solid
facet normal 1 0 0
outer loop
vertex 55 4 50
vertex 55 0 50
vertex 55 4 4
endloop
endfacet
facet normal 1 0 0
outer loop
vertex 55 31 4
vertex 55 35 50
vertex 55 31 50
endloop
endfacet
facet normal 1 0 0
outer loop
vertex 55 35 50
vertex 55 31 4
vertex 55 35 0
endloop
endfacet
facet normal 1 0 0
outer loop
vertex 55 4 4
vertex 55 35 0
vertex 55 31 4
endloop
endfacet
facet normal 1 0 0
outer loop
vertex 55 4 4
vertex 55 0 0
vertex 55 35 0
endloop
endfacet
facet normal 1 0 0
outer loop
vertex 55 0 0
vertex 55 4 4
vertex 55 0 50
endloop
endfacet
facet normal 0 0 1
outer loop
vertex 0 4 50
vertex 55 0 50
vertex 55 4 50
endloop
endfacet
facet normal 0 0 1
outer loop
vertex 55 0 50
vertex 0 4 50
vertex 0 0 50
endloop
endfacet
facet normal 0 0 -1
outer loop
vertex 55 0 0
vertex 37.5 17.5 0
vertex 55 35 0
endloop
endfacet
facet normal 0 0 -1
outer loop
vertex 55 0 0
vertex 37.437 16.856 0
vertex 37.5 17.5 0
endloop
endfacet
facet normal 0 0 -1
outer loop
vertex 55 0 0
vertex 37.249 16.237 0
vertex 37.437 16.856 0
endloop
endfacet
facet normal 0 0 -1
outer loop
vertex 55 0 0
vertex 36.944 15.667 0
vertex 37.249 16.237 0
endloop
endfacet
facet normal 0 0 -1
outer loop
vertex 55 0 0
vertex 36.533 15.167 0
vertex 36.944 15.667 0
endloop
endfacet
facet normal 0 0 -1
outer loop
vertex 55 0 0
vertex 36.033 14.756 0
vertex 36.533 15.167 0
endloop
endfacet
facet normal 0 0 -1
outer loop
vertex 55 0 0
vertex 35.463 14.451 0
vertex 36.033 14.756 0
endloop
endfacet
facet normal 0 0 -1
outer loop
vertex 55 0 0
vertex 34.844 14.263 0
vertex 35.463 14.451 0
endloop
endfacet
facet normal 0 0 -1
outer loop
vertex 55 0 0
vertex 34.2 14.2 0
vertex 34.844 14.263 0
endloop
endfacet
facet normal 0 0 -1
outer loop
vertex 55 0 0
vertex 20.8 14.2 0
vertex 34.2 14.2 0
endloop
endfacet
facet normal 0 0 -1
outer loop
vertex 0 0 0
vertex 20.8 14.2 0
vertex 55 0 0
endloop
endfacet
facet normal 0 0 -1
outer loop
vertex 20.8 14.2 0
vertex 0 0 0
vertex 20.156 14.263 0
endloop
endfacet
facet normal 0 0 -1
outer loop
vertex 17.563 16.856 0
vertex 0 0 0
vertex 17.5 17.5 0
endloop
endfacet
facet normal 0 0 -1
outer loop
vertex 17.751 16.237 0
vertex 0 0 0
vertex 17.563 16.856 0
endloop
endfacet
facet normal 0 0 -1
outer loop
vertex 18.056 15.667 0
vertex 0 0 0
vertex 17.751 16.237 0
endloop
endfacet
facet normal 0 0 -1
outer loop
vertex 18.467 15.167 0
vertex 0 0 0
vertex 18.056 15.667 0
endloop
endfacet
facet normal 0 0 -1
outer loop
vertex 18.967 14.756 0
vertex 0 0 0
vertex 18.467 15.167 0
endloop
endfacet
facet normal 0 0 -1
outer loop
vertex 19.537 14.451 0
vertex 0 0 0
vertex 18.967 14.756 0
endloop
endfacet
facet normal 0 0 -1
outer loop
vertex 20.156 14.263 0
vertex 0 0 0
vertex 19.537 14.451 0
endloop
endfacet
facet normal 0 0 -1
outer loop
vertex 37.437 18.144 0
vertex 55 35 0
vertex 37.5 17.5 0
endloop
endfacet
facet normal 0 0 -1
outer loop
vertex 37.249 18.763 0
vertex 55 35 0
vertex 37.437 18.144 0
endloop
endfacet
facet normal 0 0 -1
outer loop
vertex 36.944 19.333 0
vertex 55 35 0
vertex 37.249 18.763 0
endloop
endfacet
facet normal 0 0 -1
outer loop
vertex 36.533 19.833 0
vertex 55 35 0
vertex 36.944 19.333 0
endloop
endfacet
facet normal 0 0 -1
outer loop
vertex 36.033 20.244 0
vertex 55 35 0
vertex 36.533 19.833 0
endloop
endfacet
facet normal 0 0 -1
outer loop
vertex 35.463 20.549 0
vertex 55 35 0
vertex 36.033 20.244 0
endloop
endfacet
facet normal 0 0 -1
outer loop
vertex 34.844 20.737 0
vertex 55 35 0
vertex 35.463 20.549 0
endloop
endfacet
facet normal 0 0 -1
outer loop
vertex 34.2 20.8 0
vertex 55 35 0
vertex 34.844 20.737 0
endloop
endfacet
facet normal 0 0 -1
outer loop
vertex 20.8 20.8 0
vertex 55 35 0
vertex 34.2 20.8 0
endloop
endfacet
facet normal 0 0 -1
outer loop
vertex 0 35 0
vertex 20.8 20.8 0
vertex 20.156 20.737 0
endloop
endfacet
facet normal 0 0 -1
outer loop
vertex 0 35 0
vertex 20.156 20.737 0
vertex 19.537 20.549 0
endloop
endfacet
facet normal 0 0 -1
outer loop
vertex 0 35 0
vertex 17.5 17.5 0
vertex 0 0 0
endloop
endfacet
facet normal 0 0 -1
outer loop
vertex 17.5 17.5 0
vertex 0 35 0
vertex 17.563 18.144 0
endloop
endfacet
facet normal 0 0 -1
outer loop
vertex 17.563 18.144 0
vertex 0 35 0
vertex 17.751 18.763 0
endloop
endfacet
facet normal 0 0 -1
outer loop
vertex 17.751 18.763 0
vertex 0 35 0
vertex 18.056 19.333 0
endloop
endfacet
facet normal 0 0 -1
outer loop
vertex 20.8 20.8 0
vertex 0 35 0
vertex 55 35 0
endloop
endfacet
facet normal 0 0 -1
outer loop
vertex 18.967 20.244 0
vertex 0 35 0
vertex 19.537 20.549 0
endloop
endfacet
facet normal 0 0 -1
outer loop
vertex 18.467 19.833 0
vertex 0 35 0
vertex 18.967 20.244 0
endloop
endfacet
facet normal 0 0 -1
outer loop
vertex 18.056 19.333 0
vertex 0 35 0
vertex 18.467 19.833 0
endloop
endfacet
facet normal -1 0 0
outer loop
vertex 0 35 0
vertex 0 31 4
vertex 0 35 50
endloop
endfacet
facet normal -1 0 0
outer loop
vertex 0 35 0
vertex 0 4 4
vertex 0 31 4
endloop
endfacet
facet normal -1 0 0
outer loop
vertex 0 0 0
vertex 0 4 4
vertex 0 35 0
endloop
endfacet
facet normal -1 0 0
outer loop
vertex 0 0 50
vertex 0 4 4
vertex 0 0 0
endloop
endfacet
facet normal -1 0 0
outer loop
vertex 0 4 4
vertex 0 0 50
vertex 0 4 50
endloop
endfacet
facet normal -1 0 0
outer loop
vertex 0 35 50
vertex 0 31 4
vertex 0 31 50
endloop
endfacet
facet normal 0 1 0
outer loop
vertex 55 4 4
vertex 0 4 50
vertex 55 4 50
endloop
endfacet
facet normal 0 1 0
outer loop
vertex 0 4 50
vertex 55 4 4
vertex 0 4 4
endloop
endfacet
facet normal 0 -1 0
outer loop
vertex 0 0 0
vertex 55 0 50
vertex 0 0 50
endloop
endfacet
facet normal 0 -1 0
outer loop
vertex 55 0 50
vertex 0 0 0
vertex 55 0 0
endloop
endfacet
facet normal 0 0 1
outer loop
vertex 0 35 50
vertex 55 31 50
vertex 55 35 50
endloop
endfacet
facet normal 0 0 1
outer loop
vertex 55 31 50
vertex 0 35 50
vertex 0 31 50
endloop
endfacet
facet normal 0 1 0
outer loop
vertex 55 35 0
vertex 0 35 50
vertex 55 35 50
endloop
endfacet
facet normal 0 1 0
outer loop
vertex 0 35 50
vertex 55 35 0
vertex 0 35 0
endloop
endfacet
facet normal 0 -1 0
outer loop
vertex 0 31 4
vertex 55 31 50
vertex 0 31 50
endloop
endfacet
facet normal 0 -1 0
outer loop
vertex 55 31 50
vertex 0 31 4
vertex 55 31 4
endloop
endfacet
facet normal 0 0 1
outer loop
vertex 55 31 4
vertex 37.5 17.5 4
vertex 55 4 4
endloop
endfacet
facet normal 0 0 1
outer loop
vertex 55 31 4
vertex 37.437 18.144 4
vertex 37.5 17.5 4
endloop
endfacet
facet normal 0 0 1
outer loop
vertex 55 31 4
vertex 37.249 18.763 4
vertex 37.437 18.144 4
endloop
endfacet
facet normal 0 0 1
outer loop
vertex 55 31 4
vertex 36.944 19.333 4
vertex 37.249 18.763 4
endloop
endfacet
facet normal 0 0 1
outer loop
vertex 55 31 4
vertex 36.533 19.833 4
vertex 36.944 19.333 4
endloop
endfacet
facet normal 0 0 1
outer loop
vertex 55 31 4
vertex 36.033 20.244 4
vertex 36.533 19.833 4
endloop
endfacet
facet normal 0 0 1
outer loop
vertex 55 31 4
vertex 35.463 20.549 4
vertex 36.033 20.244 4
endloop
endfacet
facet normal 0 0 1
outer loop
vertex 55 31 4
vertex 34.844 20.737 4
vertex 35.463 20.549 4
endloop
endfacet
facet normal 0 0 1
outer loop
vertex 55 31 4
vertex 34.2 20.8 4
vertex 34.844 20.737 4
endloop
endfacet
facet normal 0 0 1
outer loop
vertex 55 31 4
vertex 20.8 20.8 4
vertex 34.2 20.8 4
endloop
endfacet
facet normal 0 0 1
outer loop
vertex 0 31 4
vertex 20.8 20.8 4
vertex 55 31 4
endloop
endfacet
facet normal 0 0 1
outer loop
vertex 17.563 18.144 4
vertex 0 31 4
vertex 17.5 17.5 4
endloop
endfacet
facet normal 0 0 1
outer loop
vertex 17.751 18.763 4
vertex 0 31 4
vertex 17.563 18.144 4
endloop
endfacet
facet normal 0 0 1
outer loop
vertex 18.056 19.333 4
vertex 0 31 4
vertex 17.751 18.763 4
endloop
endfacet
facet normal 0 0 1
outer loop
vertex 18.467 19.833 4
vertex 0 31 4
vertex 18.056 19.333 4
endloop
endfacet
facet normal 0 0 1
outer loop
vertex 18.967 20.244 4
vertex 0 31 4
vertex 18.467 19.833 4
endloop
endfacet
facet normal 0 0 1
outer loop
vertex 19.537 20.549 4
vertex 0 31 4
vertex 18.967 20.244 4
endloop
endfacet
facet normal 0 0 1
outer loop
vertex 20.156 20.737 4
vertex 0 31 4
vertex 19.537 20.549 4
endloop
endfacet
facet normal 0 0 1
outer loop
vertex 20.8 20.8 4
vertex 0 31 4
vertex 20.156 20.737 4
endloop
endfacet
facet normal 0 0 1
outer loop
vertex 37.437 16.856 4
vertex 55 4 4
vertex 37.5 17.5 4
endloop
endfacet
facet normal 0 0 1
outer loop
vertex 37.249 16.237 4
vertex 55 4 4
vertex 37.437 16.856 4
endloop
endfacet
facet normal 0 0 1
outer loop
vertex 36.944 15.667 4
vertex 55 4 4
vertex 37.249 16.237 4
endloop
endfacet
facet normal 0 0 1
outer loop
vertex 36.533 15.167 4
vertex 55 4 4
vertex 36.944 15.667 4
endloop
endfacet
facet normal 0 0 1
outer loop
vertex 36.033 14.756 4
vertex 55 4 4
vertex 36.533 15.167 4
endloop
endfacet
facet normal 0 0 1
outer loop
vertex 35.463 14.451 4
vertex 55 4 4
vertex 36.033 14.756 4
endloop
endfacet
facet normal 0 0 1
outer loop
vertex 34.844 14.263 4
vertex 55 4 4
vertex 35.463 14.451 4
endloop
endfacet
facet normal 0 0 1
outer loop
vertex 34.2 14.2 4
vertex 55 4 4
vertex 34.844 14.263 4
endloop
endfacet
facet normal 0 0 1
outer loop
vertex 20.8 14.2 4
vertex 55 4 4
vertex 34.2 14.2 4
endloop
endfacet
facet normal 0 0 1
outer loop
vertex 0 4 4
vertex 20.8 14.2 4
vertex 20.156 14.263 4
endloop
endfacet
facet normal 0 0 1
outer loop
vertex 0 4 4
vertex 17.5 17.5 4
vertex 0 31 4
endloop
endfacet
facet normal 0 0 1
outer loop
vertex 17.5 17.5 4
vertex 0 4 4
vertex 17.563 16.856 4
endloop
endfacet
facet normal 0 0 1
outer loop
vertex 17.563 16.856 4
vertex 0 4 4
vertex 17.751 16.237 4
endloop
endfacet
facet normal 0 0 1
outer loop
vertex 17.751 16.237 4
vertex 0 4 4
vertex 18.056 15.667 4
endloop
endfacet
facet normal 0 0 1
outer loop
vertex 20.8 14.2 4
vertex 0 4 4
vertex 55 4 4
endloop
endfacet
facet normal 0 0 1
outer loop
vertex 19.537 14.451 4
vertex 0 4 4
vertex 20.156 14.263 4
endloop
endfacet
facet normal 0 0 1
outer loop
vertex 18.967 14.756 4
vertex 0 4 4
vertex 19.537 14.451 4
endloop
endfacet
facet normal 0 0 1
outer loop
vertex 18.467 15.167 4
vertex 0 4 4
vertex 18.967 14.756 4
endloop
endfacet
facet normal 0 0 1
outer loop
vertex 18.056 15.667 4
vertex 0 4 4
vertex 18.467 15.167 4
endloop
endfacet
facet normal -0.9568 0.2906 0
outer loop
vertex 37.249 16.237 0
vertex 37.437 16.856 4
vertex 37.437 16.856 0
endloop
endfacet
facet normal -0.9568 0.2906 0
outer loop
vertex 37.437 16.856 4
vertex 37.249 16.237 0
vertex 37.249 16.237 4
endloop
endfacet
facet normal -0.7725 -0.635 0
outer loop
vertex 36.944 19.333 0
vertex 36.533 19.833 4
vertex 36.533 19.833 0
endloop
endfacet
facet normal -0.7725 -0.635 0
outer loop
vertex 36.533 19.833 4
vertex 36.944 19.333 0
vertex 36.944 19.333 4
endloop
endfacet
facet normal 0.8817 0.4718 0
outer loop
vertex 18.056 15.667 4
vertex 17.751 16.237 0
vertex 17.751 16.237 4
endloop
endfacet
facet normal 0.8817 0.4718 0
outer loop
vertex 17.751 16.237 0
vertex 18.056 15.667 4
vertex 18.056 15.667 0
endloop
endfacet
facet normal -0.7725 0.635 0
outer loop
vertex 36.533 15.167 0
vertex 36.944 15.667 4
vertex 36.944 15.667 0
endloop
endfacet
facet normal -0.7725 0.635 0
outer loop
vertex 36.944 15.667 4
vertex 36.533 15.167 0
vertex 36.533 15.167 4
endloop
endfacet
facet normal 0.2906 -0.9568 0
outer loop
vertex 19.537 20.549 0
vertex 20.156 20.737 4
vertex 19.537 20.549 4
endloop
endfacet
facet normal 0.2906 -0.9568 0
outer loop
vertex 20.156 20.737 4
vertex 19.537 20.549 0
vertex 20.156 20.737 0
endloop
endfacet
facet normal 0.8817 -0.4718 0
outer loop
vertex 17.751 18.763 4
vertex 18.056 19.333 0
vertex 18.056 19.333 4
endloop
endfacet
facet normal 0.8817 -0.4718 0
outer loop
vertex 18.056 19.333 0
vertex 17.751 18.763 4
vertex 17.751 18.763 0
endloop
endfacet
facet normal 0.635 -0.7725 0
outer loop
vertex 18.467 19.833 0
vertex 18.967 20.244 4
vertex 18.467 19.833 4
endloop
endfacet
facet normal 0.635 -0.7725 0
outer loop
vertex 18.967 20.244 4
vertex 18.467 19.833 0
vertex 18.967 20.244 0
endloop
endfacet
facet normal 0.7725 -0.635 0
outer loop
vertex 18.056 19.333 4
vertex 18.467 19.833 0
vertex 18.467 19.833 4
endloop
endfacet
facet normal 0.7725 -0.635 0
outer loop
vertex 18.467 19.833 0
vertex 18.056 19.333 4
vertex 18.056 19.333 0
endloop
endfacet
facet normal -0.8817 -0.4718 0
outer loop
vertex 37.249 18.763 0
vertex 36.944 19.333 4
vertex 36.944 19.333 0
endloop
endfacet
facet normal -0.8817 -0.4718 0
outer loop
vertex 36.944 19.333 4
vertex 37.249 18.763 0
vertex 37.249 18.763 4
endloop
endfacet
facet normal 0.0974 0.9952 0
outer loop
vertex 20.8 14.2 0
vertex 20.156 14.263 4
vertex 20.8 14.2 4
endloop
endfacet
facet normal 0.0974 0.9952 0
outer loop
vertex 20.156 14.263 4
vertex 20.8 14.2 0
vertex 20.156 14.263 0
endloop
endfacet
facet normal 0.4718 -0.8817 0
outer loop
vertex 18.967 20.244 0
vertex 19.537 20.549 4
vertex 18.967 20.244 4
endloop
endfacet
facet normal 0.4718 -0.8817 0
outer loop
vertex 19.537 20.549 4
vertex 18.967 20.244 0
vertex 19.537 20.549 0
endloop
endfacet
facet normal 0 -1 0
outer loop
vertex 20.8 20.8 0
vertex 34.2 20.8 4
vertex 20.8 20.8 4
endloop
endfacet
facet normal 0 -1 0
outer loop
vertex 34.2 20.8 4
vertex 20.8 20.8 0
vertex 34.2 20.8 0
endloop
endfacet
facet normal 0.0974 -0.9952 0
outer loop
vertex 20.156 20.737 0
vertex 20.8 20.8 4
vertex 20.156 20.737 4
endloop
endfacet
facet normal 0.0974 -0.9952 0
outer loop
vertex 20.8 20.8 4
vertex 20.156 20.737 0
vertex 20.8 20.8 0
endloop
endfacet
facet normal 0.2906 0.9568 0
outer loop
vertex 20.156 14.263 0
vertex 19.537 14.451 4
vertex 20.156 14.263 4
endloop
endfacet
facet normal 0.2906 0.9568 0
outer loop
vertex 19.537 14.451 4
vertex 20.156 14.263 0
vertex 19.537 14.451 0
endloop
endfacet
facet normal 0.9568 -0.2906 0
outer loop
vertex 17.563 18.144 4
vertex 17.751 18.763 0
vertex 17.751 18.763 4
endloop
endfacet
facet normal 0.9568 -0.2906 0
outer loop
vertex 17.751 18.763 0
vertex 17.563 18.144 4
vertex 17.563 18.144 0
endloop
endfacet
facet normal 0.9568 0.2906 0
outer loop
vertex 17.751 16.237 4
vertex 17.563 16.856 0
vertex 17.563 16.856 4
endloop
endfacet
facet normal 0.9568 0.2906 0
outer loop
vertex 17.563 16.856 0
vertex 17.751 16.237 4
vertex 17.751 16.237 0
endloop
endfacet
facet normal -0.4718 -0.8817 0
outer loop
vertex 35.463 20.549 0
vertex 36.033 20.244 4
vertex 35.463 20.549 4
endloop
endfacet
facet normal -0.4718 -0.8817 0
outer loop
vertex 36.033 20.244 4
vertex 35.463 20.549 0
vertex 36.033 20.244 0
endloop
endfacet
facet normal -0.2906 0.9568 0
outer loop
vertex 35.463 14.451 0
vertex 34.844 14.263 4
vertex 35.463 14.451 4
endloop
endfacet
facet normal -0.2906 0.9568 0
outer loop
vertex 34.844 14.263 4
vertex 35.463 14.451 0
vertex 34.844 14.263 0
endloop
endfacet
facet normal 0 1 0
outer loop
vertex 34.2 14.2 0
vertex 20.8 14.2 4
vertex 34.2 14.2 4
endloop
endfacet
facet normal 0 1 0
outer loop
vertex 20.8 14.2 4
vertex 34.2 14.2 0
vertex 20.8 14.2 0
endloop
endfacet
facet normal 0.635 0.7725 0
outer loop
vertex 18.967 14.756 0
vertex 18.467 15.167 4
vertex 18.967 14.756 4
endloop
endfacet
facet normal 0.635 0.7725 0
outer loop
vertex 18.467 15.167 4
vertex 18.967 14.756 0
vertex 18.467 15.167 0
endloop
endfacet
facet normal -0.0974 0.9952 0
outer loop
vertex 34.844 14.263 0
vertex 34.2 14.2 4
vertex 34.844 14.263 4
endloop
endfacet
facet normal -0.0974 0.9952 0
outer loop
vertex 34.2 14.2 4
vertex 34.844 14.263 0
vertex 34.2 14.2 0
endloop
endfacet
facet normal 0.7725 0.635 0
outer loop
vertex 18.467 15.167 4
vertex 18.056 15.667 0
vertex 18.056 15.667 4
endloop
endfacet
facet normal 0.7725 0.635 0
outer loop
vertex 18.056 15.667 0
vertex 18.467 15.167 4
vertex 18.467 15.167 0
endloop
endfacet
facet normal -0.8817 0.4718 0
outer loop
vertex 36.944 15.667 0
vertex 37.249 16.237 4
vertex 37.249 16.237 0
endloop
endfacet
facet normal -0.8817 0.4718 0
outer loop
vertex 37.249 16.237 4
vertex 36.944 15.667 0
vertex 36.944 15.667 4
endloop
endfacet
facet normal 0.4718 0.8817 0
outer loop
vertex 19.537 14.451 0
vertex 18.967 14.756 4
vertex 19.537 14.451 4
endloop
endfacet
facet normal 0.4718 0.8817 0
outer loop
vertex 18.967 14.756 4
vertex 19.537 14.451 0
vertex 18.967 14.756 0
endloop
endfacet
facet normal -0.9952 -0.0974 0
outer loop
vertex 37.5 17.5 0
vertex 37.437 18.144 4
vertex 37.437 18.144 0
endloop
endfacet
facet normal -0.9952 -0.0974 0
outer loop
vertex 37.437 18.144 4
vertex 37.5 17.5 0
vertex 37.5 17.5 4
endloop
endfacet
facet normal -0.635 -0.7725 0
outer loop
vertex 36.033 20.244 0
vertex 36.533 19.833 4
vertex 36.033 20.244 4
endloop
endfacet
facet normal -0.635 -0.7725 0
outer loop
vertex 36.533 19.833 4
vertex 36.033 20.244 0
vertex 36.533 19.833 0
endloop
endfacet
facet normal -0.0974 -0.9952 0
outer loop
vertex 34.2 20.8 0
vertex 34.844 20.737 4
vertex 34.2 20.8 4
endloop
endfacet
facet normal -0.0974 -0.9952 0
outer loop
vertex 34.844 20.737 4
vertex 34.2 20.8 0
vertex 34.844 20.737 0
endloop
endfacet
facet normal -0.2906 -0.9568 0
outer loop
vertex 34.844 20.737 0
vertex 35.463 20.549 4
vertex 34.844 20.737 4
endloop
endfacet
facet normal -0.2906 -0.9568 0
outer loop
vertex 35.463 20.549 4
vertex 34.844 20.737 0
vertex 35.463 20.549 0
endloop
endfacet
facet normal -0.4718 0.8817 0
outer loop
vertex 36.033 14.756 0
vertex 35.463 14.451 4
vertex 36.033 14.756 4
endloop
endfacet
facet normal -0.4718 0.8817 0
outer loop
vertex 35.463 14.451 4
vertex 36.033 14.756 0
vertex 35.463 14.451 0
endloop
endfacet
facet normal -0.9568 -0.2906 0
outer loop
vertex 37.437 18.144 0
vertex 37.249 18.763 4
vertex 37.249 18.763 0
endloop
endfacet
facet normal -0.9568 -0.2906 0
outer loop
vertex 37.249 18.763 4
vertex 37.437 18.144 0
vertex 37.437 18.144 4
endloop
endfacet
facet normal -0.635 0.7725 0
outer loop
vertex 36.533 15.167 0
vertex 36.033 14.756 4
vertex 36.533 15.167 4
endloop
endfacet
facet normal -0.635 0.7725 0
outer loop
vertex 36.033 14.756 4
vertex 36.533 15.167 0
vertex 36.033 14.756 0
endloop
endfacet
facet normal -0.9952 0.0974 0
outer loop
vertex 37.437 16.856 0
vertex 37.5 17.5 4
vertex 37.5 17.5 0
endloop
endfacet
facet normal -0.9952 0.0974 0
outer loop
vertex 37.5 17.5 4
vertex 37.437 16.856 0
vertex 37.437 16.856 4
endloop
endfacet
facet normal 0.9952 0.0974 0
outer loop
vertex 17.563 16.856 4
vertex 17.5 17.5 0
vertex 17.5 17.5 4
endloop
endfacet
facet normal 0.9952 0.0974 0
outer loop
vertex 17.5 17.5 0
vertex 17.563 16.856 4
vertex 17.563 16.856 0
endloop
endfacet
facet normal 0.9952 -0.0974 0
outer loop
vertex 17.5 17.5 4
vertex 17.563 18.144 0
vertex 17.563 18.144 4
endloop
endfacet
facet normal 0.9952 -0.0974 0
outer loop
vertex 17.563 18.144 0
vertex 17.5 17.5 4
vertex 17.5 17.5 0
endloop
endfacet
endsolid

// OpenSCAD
$fn = 32;

// ----------------------------------------------------------------------
// U-bracket: 55 x 35 x 50 mm
// ----------------------------------------------------------------------

// --- parameters (mm) ---
span = 55;                // outer length, X
outer_w = 35;             // outer width, Y
wall_h = 50;              // upright height, Z
plate_t = 4;              // wall thickness
hole_d = 6.6;             // clearance for M6
slot_l = 20;              // slot length

module hole_z(px, py) {
  translate([px, py, -0.5]) cylinder(h = plate_t + 1, d = hole_d);
}
module hole_y_pz(pz) {
  /* through both uprights along Y */
  translate([0, -0.5, pz]) rotate([-90, 0, 0]) cylinder(h = outer_w + 1, d = hole_d);
}
module slot_z(px, py) {
  hull() {
    translate([px - (slot_l - hole_d) / 2, py, -0.5]) cylinder(h = plate_t + 1, d = hole_d);
    translate([px + (slot_l - hole_d) / 2, py, -0.5]) cylinder(h = plate_t + 1, d = hole_d);
  }
}

module base() {
  cube([span, outer_w, plate_t]);
}

module uprights() {
  cube([span, plate_t, wall_h]);
  translate([0, outer_w - plate_t, 0]) cube([span, plate_t, wall_h]);
}

difference() {
  union() {
    base();
    uprights();
  }
  slot_z(27.5, 17.5);
}
